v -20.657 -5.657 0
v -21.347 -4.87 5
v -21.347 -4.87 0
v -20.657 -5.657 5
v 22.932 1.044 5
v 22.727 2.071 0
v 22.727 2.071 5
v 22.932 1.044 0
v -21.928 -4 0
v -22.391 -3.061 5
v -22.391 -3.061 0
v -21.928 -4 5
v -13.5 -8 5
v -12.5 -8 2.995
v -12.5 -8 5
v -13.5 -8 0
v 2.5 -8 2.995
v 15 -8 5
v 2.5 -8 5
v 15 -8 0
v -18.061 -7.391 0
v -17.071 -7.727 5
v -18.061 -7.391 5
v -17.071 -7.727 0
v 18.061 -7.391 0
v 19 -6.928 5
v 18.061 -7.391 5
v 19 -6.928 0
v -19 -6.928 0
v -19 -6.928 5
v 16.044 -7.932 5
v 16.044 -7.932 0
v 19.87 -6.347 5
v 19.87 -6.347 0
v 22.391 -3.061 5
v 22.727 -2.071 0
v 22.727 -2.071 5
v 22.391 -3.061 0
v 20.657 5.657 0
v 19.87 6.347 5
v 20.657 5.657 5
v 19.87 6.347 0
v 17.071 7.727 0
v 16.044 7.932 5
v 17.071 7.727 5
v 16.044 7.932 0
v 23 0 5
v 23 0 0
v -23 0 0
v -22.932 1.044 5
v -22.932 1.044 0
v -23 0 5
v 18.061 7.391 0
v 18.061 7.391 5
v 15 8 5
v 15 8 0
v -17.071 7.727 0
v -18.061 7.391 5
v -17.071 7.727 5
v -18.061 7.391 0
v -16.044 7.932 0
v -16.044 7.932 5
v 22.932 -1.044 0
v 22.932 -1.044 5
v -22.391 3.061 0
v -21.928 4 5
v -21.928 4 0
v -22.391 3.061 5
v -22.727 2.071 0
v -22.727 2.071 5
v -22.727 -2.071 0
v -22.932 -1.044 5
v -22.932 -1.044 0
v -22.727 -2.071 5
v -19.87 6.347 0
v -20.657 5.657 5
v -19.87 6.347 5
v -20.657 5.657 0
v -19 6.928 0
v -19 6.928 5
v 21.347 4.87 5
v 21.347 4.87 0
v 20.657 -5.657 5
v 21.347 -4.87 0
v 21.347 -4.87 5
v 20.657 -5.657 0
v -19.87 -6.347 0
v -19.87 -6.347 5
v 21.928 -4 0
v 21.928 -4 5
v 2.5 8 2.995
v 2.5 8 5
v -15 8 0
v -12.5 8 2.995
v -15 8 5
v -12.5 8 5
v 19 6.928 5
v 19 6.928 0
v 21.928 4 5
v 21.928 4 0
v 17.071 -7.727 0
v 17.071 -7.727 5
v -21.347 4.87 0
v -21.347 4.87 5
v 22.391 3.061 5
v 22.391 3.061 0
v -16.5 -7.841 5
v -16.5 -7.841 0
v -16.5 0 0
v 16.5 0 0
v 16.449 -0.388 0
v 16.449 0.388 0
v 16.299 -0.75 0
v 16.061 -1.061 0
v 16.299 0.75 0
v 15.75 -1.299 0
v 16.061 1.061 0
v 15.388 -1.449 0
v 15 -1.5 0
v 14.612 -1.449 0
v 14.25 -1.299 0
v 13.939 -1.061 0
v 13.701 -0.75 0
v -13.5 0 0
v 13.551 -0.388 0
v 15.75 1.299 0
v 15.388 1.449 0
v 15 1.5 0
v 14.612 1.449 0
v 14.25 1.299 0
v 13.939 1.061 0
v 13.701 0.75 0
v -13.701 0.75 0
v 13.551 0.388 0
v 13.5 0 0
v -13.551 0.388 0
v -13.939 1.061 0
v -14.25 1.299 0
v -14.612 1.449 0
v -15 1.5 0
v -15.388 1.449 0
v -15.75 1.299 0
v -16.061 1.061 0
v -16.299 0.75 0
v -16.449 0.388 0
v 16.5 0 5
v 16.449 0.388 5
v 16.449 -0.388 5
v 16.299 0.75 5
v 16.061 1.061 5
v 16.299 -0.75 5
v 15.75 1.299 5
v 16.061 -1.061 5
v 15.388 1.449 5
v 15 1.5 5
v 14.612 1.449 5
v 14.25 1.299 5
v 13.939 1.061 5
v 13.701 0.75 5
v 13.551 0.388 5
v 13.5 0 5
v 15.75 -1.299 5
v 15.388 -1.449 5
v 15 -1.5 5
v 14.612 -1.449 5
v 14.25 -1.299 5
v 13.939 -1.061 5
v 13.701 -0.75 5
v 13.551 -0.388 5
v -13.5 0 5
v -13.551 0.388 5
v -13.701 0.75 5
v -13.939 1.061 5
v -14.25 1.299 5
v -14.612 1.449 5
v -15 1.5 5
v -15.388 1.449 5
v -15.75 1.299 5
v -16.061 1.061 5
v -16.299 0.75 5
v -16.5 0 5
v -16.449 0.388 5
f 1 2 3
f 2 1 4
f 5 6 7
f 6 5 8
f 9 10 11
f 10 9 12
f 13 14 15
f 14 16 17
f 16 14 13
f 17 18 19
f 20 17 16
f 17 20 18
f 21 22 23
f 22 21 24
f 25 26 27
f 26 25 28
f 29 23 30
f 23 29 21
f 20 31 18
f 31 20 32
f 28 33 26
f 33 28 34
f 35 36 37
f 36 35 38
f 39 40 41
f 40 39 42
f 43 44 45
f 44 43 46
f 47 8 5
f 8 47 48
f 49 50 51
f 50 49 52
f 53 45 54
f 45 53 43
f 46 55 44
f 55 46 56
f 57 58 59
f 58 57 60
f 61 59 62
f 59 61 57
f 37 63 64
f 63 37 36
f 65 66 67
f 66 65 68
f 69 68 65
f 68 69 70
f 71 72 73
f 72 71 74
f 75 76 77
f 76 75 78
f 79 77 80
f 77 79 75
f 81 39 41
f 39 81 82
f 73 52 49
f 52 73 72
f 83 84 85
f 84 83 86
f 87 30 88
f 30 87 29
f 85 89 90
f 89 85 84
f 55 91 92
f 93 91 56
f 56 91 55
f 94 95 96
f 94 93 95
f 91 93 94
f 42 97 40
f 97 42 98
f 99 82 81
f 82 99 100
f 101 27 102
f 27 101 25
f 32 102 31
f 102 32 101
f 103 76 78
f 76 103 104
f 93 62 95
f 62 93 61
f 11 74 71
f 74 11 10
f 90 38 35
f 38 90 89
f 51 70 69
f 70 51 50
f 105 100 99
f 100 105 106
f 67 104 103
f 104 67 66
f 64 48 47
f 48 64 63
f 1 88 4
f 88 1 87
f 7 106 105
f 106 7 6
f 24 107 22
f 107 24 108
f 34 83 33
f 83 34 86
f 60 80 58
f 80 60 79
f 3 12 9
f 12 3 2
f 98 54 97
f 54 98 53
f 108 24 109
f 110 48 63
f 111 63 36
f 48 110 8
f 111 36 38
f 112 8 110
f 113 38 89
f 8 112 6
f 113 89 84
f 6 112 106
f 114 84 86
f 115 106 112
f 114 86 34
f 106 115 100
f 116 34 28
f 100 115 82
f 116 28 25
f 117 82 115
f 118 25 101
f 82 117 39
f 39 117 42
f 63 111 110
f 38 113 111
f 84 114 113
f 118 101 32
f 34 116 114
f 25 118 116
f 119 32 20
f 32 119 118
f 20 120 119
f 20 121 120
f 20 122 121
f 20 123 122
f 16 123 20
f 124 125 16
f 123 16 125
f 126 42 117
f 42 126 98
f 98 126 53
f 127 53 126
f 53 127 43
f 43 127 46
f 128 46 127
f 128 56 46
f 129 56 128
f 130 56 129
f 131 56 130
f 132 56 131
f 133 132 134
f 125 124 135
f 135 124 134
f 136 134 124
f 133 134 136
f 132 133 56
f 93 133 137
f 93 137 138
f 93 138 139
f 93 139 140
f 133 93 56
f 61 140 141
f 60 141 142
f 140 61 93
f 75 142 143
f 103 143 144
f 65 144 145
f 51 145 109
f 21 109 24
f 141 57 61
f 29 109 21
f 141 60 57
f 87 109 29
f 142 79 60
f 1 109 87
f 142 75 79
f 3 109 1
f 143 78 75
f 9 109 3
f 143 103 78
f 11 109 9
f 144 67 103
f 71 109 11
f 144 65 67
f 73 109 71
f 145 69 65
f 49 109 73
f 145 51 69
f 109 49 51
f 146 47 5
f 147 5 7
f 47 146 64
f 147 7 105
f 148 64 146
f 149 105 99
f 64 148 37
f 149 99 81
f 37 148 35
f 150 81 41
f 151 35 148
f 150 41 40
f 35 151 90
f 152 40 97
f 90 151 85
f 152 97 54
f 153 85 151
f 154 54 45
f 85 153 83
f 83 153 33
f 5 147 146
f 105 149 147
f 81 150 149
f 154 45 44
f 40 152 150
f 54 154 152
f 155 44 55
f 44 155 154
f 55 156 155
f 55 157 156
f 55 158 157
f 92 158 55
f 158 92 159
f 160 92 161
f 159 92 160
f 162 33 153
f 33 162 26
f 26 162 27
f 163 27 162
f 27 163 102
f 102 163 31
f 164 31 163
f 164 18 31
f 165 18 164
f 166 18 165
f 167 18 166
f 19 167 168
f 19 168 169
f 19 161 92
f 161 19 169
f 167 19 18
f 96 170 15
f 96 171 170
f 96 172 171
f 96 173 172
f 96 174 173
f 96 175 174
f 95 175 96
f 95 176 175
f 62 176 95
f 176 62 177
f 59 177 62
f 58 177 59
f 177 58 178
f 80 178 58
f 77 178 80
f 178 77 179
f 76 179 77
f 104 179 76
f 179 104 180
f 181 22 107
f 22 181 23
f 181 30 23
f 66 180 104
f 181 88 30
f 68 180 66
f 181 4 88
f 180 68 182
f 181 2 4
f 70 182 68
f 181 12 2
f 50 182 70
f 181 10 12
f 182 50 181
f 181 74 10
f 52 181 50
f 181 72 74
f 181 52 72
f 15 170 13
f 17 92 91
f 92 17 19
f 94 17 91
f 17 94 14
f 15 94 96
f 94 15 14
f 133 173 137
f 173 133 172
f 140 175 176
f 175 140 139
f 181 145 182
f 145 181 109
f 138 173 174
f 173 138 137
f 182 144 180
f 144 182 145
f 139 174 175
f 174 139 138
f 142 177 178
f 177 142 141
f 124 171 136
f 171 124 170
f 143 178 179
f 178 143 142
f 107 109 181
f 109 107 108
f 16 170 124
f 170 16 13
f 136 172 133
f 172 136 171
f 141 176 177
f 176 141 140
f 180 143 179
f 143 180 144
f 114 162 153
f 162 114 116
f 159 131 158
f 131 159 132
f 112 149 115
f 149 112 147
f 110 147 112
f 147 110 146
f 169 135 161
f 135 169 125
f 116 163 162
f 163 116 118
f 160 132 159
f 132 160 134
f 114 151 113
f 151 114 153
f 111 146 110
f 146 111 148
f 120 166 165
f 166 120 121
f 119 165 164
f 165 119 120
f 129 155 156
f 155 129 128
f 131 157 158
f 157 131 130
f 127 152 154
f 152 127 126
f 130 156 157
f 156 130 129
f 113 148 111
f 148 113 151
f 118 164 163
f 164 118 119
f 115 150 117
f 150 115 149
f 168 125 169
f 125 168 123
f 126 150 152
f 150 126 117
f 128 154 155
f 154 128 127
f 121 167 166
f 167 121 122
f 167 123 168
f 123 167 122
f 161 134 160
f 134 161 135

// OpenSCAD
// Trombone case grip

// Copyright (C) 2017 Jeremy Bennett <jeremy@jeremybennett.com>

// Contributor: Jeremy Bennett <jeremy@jeremybennett.com>

// This file is licensed under the Creative Commons Attribution-ShareAlike 3.0
// Unported License. To view a copy of this license, visit
// http://creativecommons.org/licenses/by-sa/3.0/ or send a letter to Creative
// Commons, PO Box 1866, Mountain View, CA 94042, USA.

// Stop a mouthpiece rolling around

// Small amount to ensure overaps when needed

EPS = 0.01;


module block () {
     hull () {
	  translate (v = [15, 0, 0])
	       cylinder (r = 8, h = 5, $fn = 48, center = false);
	  translate (v = [-15, 0, 0])
	       cylinder (r = 8, h = 5, $fn = 48, center = false);
     }
}


module shaped_block () {
     difference () {
	  block ();
	  translate (v = [-5, 0, 3/2 + 3])
	       cube (size = [15, 20, 3 + EPS], center = true);
     }
}

module notched_block () {
     difference () {
	  shaped_block ();
	  hull () {
	       translate (v = [-15, 0, 0])
		    cylinder (r = 1.5, h = 20, $fn = 24, center = true);
	       translate (v = [-15, -10, 0])
		    cylinder (r = 1.5, h = 20, $fn = 24, center = true);
	  }
     }
}

module grip () {
     difference () {
	  notched_block ();
	  translate (v = [15, 0, 0])
	       cylinder (r = 1.5, h = 20, $fn = 24, center = true);
     }
}

grip ();
